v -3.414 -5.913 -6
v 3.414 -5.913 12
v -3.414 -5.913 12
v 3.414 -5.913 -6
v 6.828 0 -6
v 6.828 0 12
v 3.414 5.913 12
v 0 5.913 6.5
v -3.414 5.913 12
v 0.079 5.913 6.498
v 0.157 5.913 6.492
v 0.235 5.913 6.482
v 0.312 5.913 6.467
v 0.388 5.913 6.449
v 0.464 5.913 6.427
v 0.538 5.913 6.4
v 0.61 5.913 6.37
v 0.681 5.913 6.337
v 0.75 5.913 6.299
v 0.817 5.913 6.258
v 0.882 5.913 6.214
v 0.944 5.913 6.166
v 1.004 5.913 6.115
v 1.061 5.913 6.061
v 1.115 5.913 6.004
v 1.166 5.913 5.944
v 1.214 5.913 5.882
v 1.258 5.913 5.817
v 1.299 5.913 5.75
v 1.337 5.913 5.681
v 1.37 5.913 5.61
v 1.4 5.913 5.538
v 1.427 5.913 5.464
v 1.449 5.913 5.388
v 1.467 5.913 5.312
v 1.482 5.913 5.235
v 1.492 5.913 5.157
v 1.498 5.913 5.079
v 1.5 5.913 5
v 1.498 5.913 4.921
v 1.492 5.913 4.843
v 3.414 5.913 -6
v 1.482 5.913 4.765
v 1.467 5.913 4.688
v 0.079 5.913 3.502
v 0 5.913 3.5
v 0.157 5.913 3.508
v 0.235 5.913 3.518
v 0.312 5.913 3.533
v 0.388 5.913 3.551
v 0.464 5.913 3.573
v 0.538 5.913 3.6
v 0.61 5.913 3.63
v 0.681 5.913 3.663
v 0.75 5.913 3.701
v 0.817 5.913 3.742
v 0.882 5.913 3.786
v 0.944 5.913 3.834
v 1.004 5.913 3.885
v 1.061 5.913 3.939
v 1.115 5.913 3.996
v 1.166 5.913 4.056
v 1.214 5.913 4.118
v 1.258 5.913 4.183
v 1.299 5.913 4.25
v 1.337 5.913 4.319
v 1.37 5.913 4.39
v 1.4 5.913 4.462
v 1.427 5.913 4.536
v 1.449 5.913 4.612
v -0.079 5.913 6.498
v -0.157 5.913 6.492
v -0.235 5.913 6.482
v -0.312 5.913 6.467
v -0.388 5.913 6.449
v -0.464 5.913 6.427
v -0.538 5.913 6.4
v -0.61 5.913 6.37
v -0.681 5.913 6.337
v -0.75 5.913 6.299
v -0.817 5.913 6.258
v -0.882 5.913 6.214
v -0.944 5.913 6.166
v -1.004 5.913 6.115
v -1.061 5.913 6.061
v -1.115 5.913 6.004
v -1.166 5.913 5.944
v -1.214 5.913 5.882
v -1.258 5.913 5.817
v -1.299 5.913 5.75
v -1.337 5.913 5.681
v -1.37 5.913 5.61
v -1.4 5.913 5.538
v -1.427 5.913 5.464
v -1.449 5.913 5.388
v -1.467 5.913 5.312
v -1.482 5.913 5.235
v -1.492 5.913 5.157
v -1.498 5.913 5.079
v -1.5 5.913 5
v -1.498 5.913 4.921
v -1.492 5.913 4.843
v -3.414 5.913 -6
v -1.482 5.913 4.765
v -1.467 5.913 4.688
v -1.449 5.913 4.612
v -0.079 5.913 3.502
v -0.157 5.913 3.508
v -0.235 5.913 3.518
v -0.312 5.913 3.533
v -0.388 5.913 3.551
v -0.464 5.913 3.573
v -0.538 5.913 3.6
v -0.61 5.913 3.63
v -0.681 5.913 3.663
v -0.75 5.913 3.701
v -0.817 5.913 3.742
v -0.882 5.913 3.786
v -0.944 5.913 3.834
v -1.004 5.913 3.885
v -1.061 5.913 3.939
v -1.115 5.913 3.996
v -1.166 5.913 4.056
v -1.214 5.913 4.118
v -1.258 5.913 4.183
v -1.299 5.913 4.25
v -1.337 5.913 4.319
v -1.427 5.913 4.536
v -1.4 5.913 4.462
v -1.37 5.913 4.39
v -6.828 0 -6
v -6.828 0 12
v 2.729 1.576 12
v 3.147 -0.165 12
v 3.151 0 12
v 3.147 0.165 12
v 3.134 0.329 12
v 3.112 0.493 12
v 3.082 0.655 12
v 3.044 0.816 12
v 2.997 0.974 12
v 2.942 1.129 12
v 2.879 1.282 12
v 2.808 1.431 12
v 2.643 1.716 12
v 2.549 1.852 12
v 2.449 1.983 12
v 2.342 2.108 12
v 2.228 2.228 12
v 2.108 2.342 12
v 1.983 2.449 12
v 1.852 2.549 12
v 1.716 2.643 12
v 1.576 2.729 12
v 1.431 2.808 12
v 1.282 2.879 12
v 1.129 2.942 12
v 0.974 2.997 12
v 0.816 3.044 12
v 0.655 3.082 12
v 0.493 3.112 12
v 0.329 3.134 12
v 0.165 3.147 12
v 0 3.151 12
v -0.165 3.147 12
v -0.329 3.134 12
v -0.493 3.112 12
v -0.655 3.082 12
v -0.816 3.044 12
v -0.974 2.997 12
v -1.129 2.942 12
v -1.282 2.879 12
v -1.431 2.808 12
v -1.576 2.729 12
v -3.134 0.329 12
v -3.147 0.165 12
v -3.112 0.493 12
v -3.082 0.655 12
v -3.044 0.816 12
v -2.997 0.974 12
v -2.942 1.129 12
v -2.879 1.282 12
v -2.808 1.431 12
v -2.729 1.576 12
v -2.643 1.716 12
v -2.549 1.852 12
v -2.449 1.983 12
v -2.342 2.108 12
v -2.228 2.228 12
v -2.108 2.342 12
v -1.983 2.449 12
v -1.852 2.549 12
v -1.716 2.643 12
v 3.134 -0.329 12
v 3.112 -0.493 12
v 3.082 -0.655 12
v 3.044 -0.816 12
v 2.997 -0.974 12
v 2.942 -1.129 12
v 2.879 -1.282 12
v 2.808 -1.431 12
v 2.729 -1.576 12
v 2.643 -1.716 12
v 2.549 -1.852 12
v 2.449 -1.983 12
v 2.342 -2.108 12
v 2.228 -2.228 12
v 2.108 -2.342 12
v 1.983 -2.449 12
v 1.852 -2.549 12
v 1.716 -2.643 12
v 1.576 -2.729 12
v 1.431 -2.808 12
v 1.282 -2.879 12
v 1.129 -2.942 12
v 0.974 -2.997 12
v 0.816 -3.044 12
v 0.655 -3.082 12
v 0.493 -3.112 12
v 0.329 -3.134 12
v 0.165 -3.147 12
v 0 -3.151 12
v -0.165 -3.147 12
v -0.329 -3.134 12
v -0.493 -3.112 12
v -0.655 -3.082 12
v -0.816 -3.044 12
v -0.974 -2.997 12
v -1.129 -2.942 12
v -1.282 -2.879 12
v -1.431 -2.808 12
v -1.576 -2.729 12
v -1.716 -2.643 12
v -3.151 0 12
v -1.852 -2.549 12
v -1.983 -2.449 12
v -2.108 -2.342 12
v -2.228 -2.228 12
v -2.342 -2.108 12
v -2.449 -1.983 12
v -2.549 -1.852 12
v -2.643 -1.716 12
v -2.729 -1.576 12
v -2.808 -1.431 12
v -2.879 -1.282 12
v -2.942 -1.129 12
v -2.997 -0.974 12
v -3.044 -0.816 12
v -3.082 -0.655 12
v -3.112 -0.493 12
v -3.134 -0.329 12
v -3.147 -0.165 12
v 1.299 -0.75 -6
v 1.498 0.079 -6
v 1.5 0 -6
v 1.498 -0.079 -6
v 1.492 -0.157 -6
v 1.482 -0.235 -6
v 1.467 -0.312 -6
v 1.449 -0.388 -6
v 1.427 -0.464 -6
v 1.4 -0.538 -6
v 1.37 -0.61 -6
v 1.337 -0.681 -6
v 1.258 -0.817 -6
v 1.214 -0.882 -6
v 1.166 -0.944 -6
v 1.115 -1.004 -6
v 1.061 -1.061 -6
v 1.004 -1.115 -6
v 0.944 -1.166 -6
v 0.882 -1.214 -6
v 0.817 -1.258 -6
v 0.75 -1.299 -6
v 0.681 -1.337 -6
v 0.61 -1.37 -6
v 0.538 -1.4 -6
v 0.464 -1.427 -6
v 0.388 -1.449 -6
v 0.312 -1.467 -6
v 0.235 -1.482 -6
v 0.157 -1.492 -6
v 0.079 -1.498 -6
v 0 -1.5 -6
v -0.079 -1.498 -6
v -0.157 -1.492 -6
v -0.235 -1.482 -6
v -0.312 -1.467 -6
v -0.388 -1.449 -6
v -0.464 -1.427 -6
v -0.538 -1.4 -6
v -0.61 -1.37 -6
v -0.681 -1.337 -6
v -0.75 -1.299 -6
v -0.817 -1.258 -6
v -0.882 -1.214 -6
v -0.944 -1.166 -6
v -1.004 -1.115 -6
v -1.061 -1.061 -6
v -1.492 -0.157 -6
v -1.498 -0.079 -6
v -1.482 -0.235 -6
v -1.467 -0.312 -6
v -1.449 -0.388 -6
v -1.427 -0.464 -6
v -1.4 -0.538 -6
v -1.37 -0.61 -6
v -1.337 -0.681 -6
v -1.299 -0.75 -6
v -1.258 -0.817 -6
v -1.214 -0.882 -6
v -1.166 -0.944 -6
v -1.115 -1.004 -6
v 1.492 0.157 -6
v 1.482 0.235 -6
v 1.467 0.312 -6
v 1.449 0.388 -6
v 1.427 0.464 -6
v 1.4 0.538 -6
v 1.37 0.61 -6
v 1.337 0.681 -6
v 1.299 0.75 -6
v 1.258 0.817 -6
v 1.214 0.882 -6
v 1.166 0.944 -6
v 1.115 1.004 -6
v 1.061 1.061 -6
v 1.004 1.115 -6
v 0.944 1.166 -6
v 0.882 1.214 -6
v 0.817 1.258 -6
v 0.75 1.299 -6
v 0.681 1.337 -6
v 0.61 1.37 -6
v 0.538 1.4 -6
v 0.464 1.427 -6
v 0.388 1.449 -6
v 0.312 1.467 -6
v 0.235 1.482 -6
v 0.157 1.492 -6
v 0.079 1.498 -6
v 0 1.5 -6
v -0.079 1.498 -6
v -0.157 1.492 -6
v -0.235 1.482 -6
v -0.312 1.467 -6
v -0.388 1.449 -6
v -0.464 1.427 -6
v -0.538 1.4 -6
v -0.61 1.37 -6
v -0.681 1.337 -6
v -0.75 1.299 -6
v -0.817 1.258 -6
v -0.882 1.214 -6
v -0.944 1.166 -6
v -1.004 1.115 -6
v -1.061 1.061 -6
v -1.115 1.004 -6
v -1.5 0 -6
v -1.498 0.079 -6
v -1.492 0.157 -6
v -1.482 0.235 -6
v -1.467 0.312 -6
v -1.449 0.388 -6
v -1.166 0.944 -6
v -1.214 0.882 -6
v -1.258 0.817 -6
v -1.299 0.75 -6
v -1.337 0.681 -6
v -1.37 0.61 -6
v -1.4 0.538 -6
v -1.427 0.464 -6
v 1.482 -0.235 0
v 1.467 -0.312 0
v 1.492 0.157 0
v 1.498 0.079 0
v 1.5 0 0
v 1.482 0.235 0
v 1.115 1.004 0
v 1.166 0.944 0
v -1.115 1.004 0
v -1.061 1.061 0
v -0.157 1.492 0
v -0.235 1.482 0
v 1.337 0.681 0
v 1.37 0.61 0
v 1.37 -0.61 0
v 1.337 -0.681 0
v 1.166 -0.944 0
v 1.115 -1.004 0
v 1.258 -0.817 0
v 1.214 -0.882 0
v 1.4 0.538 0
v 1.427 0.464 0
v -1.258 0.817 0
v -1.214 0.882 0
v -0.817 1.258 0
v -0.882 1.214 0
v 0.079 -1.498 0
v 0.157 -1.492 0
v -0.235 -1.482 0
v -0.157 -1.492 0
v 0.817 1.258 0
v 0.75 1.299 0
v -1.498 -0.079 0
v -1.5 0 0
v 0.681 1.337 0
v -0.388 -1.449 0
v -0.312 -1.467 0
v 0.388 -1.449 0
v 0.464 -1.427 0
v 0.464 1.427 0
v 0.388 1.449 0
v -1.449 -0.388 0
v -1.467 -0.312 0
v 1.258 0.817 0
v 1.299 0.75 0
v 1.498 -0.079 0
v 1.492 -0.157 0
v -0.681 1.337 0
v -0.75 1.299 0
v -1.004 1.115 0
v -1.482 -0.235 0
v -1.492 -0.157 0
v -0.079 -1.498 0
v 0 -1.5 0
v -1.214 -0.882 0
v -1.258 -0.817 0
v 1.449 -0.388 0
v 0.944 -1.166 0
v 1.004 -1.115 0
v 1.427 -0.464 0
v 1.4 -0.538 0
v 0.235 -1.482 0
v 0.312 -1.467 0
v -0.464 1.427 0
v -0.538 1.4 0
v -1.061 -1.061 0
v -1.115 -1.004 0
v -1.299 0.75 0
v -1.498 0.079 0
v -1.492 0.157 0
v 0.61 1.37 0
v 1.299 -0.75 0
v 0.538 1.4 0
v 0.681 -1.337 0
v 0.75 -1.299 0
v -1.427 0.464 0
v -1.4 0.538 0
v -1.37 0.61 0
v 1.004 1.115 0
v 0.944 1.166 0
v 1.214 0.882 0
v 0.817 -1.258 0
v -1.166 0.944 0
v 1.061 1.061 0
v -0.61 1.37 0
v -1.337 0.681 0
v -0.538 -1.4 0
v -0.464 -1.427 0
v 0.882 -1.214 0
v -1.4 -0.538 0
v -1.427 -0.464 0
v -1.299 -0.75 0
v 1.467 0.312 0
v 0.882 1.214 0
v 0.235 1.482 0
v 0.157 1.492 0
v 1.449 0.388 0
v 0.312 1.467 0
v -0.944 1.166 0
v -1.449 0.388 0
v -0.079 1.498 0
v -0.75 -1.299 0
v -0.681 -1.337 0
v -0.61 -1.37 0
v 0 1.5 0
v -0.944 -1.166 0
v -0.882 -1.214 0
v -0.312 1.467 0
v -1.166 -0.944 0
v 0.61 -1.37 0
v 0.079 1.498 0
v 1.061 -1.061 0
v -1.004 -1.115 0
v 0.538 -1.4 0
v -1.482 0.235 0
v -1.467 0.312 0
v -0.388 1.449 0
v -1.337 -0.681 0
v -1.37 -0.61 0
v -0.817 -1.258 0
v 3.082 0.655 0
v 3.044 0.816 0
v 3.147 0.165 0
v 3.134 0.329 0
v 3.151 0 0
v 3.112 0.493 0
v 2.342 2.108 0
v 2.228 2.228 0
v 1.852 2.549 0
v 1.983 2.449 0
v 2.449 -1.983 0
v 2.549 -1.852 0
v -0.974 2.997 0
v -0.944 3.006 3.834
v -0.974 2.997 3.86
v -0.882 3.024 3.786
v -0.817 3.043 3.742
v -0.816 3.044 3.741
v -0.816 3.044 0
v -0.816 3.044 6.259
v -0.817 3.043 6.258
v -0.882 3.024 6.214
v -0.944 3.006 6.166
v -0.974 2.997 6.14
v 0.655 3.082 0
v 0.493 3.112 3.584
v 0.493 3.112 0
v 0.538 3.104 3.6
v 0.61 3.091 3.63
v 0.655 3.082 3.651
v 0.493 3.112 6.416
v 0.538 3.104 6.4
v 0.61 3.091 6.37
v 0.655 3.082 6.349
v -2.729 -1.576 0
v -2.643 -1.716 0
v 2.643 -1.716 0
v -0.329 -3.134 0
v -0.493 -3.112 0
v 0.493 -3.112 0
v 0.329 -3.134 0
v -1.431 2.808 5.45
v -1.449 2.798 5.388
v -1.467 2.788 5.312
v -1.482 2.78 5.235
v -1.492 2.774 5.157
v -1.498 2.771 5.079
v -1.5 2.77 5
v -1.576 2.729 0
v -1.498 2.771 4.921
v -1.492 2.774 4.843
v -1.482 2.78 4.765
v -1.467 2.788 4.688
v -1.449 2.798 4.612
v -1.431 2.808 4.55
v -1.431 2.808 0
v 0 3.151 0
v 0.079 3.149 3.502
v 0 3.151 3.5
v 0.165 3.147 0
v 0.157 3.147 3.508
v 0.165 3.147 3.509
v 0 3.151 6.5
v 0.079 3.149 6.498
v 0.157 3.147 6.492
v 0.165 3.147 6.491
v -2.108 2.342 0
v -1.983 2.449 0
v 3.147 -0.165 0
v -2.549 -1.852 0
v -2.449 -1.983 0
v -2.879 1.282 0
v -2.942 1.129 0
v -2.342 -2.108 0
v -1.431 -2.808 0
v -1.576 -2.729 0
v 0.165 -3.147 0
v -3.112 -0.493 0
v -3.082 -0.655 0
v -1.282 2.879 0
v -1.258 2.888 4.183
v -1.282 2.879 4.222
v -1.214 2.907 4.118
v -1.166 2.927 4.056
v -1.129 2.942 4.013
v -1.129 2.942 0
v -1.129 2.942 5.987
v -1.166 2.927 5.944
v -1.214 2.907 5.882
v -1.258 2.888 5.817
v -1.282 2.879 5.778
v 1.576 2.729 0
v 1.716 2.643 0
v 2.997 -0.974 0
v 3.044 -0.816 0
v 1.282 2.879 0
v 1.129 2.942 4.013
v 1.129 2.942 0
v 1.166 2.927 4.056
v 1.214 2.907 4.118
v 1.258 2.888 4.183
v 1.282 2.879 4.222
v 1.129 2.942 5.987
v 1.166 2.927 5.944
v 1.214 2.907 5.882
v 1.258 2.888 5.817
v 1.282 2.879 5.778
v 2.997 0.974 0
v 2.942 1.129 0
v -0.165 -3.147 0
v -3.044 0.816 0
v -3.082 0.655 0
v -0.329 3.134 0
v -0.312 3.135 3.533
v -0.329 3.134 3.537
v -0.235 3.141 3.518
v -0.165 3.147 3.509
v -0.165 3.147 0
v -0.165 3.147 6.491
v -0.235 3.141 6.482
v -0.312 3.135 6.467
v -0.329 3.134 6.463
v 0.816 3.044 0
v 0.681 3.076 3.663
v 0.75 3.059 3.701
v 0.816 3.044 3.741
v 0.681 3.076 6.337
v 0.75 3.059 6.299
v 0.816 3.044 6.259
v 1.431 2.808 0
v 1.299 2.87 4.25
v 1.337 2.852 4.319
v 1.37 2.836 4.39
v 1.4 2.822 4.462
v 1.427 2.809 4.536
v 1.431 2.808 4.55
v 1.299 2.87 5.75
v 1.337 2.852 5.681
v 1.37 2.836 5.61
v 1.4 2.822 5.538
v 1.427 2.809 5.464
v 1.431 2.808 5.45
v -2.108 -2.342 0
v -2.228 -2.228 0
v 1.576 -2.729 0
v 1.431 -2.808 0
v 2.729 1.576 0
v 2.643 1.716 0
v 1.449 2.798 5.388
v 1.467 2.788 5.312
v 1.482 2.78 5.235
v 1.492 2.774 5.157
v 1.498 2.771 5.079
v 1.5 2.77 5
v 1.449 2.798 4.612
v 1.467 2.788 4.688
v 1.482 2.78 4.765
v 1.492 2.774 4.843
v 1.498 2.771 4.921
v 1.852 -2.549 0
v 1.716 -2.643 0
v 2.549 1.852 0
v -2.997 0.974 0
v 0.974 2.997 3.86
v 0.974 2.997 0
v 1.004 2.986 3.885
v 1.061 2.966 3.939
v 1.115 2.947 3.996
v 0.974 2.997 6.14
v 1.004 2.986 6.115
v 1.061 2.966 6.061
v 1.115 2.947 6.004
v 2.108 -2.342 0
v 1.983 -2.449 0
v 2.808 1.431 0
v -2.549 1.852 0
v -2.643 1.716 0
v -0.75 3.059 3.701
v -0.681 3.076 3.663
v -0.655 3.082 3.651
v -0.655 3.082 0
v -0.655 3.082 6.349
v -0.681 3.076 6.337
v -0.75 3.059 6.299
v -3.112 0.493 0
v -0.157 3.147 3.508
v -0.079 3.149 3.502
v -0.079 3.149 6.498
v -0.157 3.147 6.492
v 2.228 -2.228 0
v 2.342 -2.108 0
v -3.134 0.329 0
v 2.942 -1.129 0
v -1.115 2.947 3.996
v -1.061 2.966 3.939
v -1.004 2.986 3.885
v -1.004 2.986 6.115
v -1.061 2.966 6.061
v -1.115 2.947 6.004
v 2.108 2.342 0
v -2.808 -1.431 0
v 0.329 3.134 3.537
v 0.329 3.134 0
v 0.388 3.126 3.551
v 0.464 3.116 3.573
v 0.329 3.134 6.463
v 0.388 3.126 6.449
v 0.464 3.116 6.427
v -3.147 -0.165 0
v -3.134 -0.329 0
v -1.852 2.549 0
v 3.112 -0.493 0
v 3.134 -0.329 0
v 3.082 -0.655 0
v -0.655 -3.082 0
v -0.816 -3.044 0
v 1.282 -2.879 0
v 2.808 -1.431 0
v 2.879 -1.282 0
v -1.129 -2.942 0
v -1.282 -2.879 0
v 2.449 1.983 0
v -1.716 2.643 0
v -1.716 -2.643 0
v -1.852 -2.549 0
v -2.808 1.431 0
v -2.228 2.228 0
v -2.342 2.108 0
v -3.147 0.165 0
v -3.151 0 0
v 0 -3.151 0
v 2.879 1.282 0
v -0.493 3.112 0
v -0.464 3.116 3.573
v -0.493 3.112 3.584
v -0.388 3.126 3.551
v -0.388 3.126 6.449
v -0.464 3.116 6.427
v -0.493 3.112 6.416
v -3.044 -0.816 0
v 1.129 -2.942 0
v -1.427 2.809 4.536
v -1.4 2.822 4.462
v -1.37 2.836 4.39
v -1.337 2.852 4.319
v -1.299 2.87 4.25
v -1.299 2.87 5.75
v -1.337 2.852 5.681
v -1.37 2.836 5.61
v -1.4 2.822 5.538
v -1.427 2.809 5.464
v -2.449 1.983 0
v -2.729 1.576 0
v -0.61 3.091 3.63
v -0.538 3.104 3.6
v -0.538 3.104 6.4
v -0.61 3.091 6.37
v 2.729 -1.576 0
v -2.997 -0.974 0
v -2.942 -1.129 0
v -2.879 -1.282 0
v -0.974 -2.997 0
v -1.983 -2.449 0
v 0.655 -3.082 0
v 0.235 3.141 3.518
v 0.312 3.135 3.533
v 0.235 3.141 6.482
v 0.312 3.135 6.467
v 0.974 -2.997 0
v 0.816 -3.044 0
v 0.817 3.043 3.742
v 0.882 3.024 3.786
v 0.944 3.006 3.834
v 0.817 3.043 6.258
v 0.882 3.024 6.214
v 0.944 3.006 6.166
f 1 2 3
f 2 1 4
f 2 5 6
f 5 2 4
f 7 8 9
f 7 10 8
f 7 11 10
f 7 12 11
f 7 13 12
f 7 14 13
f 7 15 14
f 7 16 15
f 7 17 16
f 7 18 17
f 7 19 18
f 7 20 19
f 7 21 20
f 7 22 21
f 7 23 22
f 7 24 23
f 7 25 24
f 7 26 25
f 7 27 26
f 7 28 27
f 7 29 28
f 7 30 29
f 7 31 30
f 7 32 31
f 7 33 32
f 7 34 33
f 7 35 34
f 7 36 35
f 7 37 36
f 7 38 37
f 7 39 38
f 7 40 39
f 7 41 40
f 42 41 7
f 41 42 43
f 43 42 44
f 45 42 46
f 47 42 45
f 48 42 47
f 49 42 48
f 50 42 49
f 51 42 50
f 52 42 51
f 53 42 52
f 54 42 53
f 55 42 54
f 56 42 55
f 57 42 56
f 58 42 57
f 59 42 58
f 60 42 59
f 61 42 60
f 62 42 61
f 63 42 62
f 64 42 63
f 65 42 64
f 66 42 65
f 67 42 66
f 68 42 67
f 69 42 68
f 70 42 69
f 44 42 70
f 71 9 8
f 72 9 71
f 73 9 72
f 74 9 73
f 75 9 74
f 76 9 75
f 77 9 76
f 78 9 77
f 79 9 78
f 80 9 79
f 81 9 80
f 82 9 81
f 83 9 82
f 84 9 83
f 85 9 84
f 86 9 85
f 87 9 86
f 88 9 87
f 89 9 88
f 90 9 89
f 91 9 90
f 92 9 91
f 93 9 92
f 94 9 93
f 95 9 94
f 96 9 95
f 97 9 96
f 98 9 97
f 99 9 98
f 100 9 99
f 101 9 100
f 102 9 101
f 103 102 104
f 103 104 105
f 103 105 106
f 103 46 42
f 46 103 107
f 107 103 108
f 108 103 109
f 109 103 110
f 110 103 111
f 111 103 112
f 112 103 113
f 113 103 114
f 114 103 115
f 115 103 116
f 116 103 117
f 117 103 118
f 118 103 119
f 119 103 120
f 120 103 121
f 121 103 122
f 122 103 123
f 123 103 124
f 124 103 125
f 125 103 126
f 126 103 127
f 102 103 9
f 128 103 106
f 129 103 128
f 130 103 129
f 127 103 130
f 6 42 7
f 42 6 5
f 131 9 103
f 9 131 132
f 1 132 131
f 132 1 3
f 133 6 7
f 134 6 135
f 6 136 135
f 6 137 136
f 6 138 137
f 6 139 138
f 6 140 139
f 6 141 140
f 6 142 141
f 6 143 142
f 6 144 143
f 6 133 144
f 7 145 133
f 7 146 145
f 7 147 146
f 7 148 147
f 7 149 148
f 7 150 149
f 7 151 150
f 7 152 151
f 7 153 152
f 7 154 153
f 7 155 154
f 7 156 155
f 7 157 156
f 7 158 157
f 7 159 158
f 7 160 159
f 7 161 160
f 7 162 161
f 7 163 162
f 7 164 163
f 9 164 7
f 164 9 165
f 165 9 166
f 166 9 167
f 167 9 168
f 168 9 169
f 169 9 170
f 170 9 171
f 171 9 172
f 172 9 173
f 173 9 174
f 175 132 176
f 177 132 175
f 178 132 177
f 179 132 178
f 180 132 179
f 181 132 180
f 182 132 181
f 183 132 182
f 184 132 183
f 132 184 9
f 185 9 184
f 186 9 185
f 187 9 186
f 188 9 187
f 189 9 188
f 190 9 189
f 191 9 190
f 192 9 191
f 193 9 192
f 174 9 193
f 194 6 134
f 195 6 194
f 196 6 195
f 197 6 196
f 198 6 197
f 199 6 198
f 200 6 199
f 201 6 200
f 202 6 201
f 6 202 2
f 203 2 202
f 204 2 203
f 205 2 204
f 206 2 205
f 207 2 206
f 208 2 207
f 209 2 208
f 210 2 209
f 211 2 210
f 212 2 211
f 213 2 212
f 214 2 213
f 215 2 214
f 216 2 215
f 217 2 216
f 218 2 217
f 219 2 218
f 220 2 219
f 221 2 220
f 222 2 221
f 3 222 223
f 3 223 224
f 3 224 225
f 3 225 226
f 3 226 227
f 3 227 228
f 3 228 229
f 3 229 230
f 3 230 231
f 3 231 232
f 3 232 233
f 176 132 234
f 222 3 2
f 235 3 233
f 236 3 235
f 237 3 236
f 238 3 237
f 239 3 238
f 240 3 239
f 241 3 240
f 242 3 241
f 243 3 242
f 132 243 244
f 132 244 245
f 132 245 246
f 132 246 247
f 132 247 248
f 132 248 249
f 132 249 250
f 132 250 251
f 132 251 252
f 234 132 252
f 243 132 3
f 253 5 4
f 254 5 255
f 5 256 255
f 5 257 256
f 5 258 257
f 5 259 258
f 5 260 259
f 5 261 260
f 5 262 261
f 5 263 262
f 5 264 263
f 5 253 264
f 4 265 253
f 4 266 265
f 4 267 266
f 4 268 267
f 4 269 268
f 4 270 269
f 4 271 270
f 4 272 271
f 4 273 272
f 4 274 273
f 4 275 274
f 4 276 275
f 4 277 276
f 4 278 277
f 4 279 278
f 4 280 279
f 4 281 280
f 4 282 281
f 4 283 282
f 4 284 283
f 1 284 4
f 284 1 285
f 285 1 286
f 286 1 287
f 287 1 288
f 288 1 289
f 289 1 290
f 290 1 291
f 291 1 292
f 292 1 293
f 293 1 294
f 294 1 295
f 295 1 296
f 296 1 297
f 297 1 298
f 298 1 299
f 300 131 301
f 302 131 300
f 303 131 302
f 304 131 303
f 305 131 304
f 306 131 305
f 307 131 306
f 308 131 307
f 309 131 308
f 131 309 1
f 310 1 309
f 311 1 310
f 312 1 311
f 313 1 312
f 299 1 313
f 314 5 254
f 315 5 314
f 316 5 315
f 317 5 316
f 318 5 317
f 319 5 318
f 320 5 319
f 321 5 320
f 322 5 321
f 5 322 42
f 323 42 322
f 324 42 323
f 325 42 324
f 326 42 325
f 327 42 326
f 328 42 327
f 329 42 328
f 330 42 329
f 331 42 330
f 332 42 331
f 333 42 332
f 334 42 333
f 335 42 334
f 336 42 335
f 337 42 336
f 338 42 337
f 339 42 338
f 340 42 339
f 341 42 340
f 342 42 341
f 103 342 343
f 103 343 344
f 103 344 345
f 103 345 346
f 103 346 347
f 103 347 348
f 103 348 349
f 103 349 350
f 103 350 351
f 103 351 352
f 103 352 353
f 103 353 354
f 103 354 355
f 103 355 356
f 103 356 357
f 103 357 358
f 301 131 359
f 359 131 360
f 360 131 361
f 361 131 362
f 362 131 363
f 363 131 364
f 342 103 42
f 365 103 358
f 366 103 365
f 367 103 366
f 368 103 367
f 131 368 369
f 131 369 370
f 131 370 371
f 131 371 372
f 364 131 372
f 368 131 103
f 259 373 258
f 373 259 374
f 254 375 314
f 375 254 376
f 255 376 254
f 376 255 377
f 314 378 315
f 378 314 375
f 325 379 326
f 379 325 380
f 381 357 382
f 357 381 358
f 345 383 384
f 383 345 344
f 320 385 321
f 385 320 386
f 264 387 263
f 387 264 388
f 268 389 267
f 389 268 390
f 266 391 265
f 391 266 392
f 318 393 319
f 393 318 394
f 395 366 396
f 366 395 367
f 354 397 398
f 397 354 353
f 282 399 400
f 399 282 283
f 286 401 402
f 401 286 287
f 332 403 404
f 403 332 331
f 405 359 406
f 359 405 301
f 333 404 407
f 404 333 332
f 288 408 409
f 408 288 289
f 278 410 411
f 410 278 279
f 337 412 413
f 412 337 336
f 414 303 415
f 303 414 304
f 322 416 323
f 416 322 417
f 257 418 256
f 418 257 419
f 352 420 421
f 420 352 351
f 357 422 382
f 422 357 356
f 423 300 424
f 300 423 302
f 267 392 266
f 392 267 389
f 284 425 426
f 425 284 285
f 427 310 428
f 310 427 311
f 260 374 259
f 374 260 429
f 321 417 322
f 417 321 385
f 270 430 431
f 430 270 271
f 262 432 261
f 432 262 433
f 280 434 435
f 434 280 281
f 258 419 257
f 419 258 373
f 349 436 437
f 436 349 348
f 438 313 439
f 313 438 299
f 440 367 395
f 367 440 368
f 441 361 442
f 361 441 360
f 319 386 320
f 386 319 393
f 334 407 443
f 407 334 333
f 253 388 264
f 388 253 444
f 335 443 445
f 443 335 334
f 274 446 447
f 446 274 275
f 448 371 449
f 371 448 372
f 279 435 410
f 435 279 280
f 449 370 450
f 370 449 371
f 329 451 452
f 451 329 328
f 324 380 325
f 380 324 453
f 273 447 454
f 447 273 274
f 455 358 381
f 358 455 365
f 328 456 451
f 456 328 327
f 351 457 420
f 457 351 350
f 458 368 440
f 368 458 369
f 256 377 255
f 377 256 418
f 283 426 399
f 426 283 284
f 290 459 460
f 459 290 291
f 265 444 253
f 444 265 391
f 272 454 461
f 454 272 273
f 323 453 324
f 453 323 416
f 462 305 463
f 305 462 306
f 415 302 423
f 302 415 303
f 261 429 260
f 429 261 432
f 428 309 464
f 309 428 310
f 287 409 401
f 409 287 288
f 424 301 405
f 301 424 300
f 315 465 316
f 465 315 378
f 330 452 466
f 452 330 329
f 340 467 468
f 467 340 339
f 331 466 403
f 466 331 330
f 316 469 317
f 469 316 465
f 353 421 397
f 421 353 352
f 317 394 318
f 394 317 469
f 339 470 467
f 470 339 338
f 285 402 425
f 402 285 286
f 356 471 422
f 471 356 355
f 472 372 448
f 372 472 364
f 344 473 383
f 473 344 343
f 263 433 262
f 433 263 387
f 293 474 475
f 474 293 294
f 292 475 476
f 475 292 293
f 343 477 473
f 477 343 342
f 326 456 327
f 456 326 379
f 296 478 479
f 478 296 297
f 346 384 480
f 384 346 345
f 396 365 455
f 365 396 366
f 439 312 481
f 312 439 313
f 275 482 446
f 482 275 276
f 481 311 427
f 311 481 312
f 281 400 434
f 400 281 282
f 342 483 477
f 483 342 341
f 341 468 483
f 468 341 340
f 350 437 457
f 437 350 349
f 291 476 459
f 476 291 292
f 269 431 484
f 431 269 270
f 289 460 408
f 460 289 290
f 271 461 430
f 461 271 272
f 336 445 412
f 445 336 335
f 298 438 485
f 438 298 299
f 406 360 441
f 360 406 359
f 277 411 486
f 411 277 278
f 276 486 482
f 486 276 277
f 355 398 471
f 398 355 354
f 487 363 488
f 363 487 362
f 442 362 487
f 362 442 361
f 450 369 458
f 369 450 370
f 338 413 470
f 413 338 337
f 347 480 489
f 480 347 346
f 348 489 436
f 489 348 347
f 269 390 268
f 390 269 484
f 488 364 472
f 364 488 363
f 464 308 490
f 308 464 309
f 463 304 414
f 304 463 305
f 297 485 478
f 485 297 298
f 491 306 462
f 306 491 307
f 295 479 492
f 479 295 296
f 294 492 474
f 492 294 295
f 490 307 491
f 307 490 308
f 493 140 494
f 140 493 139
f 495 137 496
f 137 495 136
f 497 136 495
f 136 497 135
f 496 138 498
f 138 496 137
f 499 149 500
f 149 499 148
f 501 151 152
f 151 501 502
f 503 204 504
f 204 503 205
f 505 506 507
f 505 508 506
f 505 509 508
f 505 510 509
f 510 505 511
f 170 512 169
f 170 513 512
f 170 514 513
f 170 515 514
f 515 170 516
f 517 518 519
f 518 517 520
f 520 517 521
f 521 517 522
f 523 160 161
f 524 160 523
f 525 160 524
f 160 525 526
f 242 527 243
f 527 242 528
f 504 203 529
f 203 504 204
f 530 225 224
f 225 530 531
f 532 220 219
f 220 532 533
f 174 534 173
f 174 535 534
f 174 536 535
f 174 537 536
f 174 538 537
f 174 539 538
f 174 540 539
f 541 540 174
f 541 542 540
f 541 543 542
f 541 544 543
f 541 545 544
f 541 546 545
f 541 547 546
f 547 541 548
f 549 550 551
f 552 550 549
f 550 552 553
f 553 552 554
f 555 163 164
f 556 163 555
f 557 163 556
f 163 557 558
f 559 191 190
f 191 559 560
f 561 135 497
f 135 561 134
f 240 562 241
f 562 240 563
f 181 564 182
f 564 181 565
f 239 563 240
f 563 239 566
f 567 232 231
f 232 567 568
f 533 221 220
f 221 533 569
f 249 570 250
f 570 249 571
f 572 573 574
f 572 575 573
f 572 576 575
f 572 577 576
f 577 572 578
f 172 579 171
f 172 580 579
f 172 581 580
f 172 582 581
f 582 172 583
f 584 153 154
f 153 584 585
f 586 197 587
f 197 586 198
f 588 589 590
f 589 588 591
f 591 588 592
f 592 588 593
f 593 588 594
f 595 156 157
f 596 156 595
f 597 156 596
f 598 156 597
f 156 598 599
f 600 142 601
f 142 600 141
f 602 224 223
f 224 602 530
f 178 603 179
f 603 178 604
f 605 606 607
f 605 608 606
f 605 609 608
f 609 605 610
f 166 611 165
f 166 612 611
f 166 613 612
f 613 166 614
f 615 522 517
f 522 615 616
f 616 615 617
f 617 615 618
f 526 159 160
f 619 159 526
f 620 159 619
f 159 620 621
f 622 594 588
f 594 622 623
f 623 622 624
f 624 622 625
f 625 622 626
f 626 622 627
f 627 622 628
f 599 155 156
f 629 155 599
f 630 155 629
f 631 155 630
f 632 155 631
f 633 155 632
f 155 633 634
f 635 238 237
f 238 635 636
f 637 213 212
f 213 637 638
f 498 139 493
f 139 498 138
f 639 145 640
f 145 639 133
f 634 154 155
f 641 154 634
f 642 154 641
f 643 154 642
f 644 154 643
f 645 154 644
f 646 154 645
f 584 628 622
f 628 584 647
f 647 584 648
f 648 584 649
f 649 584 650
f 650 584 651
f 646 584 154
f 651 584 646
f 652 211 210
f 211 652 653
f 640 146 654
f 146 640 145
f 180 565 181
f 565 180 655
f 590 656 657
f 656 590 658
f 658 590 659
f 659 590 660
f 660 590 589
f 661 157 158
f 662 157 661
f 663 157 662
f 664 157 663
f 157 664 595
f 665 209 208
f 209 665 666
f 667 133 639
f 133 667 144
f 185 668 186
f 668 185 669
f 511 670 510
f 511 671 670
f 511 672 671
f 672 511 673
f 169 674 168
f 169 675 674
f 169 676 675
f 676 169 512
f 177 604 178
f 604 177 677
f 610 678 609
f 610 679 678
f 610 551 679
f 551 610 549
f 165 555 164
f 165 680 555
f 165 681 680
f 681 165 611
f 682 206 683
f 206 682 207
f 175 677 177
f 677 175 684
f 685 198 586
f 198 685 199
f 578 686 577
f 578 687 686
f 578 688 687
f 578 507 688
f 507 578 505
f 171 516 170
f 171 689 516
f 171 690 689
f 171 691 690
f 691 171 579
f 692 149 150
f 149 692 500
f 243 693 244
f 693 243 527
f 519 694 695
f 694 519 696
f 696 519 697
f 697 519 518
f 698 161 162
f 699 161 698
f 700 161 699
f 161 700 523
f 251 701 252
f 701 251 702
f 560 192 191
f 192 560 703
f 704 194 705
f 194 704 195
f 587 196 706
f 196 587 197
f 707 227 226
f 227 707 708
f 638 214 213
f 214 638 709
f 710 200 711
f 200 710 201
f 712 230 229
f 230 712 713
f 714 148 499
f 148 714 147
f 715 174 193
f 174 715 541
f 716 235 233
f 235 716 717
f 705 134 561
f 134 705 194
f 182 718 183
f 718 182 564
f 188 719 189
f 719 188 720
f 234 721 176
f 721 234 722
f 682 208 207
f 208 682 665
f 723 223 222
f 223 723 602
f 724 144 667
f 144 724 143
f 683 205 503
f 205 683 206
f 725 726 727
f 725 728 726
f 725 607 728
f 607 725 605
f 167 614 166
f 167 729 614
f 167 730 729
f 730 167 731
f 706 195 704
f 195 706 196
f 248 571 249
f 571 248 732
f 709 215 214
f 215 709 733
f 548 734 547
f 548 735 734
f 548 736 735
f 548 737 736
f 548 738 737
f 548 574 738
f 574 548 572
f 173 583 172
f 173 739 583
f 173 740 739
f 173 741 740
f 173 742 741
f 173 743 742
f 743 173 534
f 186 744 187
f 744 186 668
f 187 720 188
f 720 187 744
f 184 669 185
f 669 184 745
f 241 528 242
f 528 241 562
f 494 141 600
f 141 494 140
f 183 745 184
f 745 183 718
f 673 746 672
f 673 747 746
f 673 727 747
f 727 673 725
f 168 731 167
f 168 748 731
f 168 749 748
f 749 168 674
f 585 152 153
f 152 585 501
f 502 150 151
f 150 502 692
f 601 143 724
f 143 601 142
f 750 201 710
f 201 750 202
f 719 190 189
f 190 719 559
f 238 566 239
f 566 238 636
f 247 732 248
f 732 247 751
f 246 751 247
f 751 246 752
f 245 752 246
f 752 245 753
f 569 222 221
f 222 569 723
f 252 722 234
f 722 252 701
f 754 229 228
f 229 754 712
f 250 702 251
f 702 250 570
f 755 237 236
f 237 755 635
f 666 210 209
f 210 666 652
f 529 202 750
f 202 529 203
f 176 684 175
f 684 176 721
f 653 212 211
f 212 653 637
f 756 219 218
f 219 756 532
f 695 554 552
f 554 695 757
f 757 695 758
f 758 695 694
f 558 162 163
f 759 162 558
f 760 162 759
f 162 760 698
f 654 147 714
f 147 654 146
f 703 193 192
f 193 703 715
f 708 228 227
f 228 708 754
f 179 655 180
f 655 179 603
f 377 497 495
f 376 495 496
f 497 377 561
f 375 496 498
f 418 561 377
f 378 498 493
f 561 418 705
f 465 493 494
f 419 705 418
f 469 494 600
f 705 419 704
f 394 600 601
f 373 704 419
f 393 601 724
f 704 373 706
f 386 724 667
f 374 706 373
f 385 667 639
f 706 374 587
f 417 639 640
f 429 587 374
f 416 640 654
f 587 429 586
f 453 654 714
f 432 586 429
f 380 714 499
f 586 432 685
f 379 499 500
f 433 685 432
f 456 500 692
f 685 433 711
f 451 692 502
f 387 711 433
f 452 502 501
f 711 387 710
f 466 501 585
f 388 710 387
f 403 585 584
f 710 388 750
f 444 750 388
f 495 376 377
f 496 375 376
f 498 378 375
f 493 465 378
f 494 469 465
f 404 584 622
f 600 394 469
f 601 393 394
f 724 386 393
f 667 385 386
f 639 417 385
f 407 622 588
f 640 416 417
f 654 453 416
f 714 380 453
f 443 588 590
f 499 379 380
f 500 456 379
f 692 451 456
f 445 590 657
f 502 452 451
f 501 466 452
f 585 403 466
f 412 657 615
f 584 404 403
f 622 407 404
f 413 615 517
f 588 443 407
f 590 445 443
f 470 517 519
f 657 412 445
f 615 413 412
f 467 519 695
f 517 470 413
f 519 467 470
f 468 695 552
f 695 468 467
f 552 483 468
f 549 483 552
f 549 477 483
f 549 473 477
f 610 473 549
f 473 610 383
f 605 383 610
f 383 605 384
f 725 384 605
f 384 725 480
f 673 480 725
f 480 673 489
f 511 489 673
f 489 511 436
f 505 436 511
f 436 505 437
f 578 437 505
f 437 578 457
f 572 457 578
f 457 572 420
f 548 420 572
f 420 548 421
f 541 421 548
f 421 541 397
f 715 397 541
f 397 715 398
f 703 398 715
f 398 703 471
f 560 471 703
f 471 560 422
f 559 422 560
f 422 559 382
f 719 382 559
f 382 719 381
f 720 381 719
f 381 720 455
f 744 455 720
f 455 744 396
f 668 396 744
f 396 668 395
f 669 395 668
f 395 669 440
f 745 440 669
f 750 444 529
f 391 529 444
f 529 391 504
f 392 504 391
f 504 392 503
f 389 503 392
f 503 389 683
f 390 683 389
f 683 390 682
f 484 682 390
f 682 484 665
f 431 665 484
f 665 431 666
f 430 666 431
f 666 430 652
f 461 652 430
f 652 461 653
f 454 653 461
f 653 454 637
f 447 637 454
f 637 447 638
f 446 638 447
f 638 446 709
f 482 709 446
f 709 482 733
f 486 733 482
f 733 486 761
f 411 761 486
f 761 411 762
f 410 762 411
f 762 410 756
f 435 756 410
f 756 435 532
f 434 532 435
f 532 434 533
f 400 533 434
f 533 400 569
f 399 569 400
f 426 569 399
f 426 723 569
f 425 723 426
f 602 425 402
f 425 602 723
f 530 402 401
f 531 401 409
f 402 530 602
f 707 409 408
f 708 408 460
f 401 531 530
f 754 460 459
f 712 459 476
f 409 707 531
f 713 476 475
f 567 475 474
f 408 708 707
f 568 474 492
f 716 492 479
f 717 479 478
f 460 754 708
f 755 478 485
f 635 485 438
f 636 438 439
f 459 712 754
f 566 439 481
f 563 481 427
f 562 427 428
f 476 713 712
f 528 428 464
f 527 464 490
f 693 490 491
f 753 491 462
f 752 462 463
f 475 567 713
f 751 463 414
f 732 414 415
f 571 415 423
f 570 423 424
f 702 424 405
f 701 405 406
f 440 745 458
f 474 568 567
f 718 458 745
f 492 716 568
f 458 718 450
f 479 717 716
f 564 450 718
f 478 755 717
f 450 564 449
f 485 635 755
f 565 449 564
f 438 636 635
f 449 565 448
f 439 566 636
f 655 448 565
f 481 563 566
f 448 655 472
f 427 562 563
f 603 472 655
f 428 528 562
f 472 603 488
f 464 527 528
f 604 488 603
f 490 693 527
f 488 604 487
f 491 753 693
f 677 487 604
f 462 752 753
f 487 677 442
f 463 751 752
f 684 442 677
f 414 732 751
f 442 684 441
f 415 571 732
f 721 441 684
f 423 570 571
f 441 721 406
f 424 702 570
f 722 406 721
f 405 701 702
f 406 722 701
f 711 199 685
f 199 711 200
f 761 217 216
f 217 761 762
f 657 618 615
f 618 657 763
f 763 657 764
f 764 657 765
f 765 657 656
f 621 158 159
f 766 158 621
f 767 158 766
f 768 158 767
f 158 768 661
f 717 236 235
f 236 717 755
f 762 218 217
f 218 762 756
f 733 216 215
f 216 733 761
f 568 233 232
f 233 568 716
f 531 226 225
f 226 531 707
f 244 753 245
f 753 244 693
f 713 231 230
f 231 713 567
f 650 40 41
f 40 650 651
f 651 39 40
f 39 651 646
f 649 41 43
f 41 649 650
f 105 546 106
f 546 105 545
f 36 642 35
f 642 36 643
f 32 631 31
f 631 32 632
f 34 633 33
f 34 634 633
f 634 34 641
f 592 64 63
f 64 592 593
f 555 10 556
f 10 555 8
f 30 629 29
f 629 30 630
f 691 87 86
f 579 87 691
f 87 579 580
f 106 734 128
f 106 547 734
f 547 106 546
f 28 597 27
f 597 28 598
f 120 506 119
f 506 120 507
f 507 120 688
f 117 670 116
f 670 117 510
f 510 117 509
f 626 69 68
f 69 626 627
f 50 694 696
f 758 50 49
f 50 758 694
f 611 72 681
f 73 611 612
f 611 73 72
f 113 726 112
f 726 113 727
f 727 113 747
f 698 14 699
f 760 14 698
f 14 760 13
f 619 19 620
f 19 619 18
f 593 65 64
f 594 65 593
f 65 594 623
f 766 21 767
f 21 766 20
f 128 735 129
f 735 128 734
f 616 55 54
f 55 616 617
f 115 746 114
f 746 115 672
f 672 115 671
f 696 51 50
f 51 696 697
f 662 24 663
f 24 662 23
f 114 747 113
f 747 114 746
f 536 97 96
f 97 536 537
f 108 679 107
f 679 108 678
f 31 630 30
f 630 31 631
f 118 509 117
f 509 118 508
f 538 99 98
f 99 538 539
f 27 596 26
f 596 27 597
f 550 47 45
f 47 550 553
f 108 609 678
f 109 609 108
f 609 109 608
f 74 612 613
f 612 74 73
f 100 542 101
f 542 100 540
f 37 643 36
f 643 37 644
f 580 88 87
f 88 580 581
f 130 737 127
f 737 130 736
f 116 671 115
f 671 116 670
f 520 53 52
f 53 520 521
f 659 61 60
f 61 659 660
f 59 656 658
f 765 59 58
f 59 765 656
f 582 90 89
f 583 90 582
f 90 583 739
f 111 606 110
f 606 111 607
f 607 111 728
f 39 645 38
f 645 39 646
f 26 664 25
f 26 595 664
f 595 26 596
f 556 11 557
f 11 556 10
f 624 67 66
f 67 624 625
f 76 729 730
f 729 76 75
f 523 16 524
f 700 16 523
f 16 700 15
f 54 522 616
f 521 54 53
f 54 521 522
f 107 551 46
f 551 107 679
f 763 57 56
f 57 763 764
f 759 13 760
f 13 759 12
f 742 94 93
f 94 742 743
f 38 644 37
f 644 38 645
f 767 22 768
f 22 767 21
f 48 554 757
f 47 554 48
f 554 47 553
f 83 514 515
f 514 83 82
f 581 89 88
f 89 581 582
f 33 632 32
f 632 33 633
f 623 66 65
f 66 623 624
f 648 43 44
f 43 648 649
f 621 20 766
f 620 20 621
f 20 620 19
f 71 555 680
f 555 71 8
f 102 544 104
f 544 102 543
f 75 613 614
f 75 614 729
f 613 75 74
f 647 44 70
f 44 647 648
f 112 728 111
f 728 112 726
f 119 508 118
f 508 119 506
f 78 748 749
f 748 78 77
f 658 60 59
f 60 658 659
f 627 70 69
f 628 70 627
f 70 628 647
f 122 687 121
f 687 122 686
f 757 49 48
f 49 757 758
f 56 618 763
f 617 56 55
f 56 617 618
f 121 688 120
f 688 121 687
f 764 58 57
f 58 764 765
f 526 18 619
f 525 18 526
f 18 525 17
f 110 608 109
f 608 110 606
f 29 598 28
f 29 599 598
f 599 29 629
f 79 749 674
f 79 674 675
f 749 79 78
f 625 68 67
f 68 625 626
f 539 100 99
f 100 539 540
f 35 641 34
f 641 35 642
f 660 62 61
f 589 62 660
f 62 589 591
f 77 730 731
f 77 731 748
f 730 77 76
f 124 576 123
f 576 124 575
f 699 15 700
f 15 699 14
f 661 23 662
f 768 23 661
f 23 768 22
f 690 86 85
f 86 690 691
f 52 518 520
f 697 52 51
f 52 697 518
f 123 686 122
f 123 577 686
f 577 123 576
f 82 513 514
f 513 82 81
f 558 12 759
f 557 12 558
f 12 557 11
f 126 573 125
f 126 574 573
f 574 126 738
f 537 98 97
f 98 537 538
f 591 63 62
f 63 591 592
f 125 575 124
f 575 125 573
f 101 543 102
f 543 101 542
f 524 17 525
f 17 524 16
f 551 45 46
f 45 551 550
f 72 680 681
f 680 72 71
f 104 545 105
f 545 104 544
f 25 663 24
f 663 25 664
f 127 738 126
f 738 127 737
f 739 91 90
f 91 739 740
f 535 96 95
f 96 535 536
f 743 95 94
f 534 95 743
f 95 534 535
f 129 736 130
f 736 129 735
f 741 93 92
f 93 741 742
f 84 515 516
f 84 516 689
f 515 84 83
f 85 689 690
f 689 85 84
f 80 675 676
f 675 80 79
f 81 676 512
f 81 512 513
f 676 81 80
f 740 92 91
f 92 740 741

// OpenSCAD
hexTolerance = 0.1;
motorShaftTolerance = 0.15;


function circleRadius(r, $fn) = r / cos(360 / 2 / $fn);

difference() {
    translate([0,0, -6])
    cylinder(r=circleRadius(r=6, $fn=6) - hexTolerance, h=18, $fn=6);
    
    translate([0,0,-7])
    cylinder(r=3 / 2, h=8, $fn=120);
    
    intersection() {
        translate([0,0,0])
        cylinder(r=circleRadius(r=3, $fn=120) + motorShaftTolerance, h=13, $fn=120);
        
        *translate([-3 - motorShaftTolerance,-3 - motorShaftTolerance,0])
        cube([6 + motorShaftTolerance * 2,5.6 + motorShaftTolerance,13]);
    }
    
    
    translate([0,0,5])
    rotate([-90,0,0])
    cylinder(r=3 / 2, h=15, $fn=120);
    
}
